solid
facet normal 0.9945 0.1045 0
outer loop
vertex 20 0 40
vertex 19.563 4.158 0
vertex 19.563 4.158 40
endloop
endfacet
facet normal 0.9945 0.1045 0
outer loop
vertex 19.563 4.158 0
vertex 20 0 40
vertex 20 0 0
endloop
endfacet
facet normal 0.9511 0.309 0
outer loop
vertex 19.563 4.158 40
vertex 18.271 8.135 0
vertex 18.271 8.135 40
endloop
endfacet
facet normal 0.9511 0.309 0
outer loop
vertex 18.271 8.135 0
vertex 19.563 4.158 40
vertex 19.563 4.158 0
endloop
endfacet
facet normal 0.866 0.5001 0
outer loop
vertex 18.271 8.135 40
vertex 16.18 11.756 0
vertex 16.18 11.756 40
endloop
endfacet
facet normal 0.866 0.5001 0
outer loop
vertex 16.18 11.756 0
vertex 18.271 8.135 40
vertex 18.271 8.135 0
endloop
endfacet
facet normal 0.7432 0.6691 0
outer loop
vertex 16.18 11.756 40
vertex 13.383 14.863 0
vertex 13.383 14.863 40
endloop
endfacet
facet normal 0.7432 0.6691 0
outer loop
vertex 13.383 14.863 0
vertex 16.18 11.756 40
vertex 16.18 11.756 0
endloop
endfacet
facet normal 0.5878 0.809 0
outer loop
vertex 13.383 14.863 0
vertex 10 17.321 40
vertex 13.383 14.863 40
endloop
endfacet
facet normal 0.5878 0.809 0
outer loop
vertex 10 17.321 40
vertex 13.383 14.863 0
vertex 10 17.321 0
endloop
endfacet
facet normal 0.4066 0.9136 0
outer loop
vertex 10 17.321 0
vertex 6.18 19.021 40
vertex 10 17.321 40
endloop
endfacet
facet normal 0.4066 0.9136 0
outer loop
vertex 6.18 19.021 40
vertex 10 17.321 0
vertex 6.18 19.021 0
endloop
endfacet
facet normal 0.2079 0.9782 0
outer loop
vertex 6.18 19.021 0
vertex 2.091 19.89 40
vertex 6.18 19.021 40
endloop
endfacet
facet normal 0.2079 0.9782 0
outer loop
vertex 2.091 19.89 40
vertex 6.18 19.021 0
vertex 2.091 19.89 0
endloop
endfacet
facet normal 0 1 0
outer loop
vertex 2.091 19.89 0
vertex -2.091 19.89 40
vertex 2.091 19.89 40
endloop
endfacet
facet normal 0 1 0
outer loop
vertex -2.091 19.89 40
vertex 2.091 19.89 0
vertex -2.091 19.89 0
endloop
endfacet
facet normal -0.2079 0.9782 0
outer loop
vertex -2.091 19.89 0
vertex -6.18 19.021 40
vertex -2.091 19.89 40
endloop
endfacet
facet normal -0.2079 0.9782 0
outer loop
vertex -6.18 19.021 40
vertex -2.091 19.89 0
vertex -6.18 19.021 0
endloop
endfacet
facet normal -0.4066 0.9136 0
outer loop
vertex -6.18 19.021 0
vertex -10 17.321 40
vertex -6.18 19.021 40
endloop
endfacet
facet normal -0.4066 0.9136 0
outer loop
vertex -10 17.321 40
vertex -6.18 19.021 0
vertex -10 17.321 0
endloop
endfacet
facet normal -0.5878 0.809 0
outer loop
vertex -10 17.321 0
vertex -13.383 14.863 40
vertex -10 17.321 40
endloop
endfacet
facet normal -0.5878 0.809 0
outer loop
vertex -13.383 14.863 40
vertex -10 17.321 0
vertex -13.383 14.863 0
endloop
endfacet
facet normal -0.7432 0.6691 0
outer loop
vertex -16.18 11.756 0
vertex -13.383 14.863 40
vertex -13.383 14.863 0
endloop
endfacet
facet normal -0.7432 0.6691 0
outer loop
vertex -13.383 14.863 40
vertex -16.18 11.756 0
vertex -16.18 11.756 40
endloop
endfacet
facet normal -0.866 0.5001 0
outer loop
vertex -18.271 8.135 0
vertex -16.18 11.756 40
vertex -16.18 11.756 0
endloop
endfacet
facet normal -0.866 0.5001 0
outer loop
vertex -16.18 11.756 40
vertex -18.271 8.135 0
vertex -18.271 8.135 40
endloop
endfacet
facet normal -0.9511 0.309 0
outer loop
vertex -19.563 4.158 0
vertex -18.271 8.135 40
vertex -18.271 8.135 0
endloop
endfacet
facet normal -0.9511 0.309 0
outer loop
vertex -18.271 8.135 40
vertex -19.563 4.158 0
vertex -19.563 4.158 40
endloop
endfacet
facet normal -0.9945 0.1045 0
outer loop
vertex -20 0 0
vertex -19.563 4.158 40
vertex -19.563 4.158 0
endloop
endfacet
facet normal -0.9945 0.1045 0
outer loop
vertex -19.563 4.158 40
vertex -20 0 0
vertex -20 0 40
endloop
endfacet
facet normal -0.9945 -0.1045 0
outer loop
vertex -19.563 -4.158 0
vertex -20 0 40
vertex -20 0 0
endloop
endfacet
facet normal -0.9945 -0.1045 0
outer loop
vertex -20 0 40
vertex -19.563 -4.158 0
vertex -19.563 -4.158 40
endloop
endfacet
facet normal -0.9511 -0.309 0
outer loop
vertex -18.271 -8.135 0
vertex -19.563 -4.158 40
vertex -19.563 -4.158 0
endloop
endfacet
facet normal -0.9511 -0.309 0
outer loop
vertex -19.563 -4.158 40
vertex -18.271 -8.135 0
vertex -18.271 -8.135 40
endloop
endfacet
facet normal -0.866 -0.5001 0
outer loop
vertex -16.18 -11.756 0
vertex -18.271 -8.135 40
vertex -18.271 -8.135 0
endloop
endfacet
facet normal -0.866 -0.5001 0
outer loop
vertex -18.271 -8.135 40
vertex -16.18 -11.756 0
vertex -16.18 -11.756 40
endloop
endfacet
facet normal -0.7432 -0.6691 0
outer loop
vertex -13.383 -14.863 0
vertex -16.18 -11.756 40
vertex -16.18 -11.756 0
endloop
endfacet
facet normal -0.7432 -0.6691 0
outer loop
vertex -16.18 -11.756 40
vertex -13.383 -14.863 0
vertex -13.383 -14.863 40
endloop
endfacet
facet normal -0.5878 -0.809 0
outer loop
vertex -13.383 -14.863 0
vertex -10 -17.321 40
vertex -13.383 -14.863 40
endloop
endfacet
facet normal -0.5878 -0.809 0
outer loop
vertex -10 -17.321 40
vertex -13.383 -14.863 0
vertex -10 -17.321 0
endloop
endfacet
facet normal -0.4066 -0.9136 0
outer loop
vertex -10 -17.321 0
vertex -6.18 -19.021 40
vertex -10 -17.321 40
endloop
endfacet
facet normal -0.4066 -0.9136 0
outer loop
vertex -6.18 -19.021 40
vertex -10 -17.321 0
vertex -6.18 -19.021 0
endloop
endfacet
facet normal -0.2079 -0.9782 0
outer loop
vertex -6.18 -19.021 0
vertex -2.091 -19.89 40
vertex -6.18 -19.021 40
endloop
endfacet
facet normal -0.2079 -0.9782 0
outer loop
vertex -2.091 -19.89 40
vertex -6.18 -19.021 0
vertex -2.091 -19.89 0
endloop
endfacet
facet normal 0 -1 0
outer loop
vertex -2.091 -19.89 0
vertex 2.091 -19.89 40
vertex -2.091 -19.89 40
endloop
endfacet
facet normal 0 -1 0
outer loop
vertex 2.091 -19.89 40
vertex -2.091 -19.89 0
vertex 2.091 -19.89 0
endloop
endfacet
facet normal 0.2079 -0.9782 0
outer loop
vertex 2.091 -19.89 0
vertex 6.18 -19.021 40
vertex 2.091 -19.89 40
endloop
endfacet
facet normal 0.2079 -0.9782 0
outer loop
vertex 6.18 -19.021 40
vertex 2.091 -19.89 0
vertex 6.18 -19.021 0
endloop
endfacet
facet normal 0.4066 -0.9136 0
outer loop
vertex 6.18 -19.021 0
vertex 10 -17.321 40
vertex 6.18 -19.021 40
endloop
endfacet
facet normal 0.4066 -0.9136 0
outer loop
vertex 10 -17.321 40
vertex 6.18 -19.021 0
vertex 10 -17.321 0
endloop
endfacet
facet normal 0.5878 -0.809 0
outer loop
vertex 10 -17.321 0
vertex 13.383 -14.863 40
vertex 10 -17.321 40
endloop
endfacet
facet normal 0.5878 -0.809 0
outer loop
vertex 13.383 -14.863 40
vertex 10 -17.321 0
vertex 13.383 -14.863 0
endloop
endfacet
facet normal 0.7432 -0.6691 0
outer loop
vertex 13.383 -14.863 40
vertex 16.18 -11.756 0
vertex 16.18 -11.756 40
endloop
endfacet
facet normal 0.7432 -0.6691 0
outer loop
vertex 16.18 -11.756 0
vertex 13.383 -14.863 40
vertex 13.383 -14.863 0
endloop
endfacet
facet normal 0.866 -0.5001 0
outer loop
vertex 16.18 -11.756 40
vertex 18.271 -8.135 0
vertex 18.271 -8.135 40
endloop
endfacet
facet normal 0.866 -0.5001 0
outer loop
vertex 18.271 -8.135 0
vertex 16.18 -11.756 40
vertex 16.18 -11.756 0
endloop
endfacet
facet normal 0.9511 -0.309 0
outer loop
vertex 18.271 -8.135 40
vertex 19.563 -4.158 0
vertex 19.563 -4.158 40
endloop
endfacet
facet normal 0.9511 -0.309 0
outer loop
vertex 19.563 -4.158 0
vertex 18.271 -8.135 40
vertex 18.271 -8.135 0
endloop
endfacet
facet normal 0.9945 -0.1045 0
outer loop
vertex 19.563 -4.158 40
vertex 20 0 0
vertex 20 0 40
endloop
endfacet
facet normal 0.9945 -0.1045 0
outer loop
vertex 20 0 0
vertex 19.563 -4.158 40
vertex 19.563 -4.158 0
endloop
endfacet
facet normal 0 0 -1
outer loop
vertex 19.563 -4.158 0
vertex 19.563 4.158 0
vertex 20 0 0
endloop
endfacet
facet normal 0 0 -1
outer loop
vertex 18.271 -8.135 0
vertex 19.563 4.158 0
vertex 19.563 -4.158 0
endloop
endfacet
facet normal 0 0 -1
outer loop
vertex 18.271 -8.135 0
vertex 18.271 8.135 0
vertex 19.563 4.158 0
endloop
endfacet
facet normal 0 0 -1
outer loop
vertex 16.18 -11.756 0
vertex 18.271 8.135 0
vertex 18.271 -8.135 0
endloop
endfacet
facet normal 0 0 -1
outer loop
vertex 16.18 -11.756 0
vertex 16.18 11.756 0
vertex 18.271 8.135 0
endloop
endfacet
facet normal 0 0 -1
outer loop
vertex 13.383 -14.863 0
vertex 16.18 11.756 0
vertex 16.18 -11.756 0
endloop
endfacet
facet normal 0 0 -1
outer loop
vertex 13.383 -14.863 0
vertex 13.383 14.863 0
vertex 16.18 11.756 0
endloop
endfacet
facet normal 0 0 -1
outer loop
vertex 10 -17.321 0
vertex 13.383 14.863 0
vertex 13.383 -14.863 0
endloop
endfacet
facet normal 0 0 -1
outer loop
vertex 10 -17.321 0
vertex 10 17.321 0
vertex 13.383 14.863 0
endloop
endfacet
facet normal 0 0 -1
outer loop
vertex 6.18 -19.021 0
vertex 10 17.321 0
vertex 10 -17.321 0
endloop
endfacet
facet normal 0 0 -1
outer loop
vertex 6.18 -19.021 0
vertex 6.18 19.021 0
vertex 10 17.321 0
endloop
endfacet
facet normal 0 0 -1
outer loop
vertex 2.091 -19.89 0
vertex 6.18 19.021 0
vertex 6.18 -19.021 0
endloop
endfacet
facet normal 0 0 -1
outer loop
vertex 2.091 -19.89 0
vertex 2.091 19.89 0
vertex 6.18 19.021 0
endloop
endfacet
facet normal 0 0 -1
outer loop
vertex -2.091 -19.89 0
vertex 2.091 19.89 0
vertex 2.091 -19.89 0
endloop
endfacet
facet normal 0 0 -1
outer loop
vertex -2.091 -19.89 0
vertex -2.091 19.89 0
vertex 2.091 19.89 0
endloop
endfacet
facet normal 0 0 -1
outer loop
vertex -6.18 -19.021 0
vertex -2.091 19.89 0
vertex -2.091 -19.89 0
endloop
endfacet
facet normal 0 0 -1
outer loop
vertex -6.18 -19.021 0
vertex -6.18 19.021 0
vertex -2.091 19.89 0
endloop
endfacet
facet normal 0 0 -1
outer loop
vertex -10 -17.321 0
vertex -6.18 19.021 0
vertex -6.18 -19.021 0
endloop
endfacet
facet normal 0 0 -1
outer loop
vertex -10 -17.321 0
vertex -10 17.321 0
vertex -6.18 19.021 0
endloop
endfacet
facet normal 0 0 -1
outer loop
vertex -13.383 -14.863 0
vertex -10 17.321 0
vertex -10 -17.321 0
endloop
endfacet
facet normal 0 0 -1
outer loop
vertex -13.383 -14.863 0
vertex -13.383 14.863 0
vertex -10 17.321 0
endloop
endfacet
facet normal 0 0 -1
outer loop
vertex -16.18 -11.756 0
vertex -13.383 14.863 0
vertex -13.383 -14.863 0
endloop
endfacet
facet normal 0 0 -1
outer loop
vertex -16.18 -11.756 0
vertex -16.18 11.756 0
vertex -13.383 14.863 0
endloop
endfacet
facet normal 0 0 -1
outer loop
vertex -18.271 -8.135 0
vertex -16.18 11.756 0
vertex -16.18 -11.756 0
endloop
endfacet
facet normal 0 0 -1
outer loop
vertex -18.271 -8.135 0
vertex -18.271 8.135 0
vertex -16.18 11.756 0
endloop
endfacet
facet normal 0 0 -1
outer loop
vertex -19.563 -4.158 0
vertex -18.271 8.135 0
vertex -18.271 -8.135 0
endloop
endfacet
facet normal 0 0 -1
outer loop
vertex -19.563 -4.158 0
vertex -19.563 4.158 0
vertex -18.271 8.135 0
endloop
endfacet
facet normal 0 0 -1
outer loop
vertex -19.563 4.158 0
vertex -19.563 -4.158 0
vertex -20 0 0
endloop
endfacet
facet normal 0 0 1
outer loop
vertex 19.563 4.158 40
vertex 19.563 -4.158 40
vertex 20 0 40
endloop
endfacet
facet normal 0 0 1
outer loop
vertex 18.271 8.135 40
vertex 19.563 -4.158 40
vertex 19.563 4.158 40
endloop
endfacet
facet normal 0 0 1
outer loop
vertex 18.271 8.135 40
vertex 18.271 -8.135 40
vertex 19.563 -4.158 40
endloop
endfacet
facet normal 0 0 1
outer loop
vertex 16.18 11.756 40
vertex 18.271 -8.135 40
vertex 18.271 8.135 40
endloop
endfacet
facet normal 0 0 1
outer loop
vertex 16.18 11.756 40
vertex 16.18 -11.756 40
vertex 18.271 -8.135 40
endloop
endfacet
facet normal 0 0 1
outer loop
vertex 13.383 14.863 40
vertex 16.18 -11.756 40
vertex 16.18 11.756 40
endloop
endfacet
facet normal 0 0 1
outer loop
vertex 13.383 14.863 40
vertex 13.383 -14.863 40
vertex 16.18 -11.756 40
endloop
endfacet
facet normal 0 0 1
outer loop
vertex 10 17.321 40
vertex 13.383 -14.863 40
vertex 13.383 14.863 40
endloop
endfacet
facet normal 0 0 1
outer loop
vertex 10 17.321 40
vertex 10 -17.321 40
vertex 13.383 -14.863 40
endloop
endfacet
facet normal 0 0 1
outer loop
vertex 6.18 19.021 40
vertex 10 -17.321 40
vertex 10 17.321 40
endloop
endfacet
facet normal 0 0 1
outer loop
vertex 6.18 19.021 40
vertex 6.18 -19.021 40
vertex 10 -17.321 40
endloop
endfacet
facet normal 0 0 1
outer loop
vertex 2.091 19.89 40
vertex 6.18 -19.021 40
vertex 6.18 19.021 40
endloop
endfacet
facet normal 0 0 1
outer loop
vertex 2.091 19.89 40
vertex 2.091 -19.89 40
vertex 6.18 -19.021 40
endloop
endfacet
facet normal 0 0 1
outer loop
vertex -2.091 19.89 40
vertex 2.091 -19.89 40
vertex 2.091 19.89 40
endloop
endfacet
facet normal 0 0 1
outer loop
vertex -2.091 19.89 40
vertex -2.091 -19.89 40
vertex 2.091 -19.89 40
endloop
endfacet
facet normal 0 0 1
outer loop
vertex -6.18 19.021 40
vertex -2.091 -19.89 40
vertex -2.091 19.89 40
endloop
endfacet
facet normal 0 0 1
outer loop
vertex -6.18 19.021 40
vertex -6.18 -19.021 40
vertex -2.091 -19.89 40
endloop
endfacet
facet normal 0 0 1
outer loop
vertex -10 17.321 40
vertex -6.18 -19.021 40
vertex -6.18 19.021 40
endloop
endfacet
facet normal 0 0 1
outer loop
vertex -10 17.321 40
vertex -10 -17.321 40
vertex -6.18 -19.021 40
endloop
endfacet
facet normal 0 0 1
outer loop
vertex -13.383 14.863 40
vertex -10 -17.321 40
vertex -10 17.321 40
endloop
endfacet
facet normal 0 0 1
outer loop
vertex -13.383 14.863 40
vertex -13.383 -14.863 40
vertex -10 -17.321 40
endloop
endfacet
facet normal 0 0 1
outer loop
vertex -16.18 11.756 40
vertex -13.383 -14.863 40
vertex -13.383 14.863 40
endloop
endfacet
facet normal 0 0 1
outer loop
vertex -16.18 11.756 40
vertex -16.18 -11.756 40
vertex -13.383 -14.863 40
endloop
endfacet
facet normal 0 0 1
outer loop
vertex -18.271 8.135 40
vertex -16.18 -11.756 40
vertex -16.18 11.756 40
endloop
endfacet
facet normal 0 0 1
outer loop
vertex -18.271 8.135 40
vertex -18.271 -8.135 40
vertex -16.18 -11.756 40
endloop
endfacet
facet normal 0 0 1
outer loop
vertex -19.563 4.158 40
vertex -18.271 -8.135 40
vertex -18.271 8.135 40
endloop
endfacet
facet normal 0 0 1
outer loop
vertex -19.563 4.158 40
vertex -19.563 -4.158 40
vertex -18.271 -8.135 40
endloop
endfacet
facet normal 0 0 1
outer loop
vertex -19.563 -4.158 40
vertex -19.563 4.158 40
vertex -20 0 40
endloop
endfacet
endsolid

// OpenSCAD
//cube([10, 20, 15], center = true);
//sphere(d = 40);

cylinder(h = 40, d1 = 40, d2 = 40);
//cylinder(h = 40, d1 = 40);

//cylinder(h = 40, d1 = 40, d2 = 0);

/*translate([0, 0, 20]) {
    sphere(r = 20);
}*/

/*translate([-20, 0, 20])
    sphere(r = 20);*/

/*scale([1.5, 1, 1])
    sphere(r = 20);*/

/*scale([1.5, 0.5, 1])
    sphere(r = 20);*/

/*rotate([0, 0, 45])
    cube([10, 20, 15]);*/
